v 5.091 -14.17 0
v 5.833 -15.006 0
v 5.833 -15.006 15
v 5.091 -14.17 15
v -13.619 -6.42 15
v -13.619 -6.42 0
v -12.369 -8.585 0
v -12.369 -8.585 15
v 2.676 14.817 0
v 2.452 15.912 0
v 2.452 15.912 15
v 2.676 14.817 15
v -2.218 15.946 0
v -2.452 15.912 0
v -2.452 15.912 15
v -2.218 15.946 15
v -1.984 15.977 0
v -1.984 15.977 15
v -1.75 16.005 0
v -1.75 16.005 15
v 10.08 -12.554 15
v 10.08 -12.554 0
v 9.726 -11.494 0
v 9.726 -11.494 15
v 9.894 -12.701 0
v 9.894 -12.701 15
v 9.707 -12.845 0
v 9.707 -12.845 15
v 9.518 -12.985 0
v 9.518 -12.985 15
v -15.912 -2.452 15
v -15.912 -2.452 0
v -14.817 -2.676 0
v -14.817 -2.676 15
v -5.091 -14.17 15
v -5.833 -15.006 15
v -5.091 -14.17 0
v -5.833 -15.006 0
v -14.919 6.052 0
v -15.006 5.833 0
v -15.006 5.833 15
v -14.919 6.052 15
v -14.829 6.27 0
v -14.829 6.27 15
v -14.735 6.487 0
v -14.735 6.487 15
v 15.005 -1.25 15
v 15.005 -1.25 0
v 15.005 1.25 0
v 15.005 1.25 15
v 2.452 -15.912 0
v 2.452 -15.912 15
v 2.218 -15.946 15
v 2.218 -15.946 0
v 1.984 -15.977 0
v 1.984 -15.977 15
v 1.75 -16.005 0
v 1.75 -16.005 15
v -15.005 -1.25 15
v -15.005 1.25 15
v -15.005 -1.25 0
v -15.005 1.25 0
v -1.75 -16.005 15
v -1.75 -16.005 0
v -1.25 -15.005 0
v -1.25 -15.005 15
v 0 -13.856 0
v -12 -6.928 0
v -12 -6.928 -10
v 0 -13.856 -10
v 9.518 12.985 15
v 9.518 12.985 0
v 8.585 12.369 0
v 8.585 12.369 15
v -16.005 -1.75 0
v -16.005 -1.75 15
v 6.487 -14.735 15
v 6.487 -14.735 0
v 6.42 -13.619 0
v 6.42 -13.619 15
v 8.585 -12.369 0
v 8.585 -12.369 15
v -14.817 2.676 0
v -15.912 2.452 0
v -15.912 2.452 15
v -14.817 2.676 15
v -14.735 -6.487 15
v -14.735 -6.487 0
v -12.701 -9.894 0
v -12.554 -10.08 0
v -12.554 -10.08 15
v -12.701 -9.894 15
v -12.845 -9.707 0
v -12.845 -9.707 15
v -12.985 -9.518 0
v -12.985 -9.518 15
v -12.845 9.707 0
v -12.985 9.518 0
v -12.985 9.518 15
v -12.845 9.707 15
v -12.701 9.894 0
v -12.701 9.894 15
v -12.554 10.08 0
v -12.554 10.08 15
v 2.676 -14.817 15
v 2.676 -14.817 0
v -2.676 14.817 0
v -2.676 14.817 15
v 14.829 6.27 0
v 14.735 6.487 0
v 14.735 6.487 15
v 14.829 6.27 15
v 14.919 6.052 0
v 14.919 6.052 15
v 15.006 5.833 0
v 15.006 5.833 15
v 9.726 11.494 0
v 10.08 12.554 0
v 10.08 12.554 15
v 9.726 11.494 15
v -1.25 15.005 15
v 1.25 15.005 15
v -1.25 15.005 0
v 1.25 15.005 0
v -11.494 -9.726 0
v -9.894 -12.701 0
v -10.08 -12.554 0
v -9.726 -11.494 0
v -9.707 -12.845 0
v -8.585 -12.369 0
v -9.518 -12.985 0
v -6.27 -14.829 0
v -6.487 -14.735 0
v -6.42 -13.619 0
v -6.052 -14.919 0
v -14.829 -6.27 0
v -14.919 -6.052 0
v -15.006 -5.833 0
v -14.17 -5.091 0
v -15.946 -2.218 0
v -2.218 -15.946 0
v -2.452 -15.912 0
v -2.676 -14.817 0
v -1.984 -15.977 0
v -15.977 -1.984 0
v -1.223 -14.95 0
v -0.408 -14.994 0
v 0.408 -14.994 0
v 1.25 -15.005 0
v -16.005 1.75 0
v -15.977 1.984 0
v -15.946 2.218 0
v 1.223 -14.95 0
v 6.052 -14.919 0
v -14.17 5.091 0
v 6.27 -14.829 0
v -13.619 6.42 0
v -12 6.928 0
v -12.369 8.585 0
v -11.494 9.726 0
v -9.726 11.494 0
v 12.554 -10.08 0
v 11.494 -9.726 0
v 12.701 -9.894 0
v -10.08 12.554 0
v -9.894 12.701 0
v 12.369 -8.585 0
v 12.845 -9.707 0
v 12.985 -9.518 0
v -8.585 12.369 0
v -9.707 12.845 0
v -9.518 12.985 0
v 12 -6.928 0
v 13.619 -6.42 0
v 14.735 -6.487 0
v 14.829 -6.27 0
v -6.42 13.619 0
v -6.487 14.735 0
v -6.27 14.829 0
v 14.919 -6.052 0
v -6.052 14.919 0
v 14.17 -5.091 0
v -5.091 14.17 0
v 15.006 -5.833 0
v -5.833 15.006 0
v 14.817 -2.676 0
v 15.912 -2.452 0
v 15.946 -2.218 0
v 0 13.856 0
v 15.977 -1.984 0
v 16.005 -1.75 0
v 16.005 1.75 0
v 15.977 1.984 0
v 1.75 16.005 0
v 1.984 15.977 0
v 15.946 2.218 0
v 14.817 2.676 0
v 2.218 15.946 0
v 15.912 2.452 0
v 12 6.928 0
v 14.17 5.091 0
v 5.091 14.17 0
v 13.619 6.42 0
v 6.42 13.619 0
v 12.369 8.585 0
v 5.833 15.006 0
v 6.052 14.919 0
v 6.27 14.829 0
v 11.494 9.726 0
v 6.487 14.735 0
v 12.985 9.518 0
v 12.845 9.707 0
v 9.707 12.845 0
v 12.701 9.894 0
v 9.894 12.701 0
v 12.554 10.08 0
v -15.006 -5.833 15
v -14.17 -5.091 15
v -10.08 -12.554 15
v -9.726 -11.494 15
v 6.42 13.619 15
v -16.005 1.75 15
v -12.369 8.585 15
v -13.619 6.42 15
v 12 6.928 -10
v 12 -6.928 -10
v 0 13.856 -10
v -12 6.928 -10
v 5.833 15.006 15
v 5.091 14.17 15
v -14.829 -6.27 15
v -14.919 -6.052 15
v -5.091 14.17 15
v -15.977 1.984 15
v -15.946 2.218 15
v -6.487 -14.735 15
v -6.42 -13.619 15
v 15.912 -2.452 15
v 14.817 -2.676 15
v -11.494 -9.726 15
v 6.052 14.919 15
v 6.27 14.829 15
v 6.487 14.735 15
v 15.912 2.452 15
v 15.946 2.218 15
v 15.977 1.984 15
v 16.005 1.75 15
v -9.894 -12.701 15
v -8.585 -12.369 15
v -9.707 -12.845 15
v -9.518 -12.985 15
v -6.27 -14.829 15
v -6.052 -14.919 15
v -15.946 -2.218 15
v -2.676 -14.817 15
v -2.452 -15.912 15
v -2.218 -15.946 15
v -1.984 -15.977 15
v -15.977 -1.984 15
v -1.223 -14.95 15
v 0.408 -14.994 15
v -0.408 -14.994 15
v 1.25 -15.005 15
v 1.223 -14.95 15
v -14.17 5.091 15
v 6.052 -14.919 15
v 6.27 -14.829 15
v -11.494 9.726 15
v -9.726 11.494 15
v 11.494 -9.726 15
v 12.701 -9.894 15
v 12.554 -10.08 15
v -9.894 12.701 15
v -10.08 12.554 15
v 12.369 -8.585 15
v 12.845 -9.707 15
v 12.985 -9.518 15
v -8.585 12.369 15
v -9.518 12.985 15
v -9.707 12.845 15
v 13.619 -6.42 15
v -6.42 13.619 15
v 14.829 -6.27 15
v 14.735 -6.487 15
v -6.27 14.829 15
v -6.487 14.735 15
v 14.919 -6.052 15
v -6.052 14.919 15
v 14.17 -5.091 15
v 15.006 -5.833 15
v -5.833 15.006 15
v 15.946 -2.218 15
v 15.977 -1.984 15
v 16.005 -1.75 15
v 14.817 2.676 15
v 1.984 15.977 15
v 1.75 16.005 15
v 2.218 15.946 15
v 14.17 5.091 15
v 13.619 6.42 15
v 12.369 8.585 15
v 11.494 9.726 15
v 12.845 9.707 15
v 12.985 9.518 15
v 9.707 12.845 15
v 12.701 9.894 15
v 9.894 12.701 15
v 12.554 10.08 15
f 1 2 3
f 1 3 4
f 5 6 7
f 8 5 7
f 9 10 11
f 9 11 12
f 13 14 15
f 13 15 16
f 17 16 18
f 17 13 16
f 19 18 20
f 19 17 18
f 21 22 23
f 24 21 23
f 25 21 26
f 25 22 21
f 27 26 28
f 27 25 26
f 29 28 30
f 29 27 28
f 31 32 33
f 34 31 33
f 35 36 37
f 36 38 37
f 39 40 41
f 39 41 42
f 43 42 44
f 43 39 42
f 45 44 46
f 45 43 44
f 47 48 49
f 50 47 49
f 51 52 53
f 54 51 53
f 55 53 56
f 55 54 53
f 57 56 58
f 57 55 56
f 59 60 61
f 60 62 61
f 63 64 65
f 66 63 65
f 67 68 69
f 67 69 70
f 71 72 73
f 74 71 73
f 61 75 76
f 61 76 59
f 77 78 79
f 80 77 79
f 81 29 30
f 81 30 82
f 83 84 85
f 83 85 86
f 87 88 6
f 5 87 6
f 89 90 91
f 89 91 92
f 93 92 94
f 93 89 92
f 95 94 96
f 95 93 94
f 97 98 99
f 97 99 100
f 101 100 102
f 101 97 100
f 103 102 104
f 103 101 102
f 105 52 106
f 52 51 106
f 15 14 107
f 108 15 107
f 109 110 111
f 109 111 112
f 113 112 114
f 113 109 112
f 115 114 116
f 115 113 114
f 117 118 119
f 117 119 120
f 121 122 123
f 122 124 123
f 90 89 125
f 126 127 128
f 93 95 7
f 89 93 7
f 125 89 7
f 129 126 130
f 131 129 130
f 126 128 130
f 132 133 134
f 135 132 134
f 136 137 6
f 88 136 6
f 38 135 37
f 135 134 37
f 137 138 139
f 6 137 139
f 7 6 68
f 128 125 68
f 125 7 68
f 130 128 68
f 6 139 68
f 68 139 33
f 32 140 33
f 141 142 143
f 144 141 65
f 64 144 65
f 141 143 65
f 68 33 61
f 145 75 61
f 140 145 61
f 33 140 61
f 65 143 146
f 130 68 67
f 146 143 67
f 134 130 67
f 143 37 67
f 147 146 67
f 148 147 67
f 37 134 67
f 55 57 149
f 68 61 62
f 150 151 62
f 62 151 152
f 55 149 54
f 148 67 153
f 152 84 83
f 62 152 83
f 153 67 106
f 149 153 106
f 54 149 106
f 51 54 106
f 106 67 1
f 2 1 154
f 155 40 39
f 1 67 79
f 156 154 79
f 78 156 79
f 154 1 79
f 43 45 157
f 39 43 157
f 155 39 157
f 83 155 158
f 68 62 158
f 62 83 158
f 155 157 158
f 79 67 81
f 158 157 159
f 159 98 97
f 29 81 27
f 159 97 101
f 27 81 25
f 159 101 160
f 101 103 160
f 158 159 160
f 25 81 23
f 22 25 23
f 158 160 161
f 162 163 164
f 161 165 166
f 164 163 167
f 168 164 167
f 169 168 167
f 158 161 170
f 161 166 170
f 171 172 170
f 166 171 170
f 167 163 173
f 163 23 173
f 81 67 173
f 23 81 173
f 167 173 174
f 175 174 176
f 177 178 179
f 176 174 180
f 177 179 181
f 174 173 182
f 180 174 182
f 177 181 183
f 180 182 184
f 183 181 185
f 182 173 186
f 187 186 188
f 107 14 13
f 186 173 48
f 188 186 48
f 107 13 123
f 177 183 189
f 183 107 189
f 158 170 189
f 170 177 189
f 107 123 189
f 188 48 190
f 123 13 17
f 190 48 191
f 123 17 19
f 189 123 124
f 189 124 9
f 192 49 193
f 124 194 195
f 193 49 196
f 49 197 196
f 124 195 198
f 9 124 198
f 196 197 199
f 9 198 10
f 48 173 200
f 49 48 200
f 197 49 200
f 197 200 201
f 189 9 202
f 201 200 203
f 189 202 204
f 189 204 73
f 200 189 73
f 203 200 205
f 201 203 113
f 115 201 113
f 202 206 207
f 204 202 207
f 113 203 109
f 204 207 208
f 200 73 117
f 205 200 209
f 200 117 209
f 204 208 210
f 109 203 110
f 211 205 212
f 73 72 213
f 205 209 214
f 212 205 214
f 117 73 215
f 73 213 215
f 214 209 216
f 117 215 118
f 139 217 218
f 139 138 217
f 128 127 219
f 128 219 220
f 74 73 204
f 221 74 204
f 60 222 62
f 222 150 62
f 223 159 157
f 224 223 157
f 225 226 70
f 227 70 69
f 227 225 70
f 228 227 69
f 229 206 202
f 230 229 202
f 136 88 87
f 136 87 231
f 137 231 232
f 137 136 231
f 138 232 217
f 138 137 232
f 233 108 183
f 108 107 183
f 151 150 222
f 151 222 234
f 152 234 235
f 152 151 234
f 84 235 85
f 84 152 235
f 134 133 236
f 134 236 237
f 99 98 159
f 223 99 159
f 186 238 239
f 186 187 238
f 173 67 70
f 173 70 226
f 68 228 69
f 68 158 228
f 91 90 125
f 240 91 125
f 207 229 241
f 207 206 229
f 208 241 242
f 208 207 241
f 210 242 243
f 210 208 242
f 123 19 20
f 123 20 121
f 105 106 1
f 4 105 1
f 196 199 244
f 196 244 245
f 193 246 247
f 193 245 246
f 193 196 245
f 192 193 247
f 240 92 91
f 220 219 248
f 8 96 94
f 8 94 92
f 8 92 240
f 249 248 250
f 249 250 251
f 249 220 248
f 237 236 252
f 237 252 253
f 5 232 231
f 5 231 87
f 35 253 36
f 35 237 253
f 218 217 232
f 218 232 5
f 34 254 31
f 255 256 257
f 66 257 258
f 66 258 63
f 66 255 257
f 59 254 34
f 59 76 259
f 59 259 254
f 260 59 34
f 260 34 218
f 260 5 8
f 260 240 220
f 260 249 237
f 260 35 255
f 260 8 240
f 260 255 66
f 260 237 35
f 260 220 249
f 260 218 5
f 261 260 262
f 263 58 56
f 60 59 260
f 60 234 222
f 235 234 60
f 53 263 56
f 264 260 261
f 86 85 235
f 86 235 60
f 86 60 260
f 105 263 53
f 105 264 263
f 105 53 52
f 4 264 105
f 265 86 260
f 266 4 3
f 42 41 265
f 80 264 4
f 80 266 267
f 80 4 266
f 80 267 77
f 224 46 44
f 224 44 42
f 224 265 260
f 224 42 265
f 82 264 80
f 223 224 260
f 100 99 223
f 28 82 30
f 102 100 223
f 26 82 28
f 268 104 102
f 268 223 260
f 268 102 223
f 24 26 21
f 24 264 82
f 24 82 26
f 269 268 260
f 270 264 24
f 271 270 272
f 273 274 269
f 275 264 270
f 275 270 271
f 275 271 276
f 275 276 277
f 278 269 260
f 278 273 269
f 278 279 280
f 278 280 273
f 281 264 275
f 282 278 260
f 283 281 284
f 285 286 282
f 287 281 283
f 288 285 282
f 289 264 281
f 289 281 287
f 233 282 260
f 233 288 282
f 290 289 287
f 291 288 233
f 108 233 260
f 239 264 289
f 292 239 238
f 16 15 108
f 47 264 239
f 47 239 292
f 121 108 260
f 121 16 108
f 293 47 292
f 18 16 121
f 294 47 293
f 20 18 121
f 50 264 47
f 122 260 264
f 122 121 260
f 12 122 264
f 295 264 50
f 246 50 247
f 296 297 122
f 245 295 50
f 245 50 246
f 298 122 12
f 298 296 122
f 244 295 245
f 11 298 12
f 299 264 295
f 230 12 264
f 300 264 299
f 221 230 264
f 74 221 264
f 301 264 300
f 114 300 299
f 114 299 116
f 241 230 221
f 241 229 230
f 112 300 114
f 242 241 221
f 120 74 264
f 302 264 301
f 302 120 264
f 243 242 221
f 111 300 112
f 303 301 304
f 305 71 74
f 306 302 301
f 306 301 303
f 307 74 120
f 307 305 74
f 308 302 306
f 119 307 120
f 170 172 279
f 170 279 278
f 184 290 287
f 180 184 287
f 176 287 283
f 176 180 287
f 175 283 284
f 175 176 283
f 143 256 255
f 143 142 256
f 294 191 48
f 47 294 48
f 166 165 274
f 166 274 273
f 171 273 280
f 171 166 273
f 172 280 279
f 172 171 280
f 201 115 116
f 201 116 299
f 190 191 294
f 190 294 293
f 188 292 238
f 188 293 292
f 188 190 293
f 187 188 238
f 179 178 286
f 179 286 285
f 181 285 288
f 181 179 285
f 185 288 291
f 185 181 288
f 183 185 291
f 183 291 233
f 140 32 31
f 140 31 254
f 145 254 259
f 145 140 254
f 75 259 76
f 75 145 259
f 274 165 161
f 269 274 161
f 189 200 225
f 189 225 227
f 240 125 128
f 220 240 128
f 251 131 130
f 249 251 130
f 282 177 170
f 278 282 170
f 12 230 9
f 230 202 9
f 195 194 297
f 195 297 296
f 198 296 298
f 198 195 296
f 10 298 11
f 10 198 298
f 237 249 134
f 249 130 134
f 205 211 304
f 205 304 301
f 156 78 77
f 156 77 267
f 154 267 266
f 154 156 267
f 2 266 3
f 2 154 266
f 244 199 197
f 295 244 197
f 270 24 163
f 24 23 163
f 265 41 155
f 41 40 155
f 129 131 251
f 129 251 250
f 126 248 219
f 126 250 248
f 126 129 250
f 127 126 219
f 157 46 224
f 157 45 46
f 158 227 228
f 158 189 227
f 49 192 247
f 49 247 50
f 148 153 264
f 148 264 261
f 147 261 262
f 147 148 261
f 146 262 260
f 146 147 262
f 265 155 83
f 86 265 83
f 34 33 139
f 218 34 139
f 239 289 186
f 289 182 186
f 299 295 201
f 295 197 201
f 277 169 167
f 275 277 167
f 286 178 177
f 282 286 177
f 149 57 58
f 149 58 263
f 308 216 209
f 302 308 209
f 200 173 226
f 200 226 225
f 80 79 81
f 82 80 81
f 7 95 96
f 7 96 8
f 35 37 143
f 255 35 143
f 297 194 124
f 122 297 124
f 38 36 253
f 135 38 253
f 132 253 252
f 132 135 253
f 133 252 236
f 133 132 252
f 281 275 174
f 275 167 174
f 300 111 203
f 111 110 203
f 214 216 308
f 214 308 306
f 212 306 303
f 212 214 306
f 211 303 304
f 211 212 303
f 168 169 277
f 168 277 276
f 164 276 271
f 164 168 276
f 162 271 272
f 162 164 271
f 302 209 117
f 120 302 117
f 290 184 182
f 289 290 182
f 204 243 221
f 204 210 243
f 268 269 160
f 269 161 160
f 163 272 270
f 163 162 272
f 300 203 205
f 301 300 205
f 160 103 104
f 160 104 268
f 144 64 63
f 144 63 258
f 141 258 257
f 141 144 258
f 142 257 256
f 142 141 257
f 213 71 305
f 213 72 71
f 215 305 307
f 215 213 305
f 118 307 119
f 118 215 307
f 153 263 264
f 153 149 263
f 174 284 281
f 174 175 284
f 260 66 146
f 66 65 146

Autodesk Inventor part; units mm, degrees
ref_plane "YZ Plane" through (0, 0, 0) normal (1, 0, 0) x (0, 1, 0)
ref_plane "XZ Plane" through (0, 0, 0) normal (0, 1, 0) x (-1, 0, 0)
ref_plane "XY Plane" through (0, 0, 0) normal (0, 0, 1) x (1, 0, 0)
sketch "Sketch1" plane through (0, 0, 0) normal (0, 0, 1) x (1, 0, 0)
  circle A0 centre (0, 0) radius 17.25
  circle A1 centre (0, 0) radius 16.1
  circle A2 centre (0, 0) radius 15
  line L0 (-1.25, -15.0046) -> (1.25, -15.0046)
  line L1 (-1.75, -16.0046) -> (1.75, -16.0046)
  line L2 (1.75, -16.0046) -> (1.25, -15.0046)
  line L3 (-1.75, -16.0046) -> (-1.25, -15.0046)
  line L4 (-1.25, -15.0046) -> (-1.2227, -14.9501)
  line L5 (1.25, -15.0046) -> (1.2227, -14.9501)
  line L6 (2.6761, -14.8169) -> (5.0909, -14.1698)
  line L7 (2.4519, -15.9122) -> (2.6761, -14.8169)
  line L8 (2.6761, -14.8169) -> (2.6883, -14.7571)
  line L9 (5.8327, -15.0063) -> (5.0909, -14.1698)
  line L10 (5.0909, -14.1698) -> (5.0504, -14.1242)
  line L11 (6.4198, -13.6194) -> (8.5848, -12.3694)
  line L12 (6.4868, -14.7354) -> (6.4198, -13.6194)
  line L13 (6.4198, -13.6194) -> (6.4161, -13.5585)
  line L14 (9.5178, -12.9854) -> (8.5848, -12.3694)
  line L15 (8.5848, -12.3694) -> (8.534, -12.3358)
  line L16 (9.726, -11.4937) -> (11.4937, -9.726)
  line L17 (10.0795, -12.5544) -> (9.726, -11.4937)
  line L18 (9.726, -11.4937) -> (9.7067, -11.4359)
  line L19 (12.5544, -10.0795) -> (11.4937, -9.726)
  line L20 (11.4937, -9.726) -> (11.4359, -9.7067)
  line L21 (12.3694, -8.5848) -> (13.6194, -6.4198)
  line L22 (12.9854, -9.5178) -> (12.3694, -8.5848)
  line L23 (12.3694, -8.5848) -> (12.3358, -8.534)
  line L24 (14.7354, -6.4868) -> (13.6194, -6.4198)
  line L25 (13.6194, -6.4198) -> (13.5585, -6.4161)
  line L26 (14.1698, -5.0909) -> (14.8169, -2.6761)
  line L27 (15.0063, -5.8327) -> (14.1698, -5.0909)
  line L28 (14.1698, -5.0909) -> (14.1242, -5.0504)
  line L29 (15.9122, -2.4519) -> (14.8169, -2.6761)
  line L30 (14.8169, -2.6761) -> (14.7571, -2.6883)
  line L31 (15.0046, -1.25) -> (15.0046, 1.25)
  line L32 (16.0046, -1.75) -> (15.0046, -1.25)
  line L33 (15.0046, -1.25) -> (14.9501, -1.2227)
  line L34 (16.0046, 1.75) -> (15.0046, 1.25)
  line L35 (15.0046, 1.25) -> (14.9501, 1.2227)
  line L36 (14.8169, 2.6761) -> (14.1698, 5.0909)
  line L37 (15.9122, 2.4519) -> (14.8169, 2.6761)
  line L38 (14.8169, 2.6761) -> (14.7571, 2.6883)
  line L39 (15.0063, 5.8327) -> (14.1698, 5.0909)
  line L40 (14.1698, 5.0909) -> (14.1242, 5.0504)
  line L41 (13.6194, 6.4198) -> (12.3694, 8.5848)
  line L42 (14.7354, 6.4868) -> (13.6194, 6.4198)
  line L43 (13.6194, 6.4198) -> (13.5585, 6.4161)
  line L44 (12.9854, 9.5178) -> (12.3694, 8.5848)
  line L45 (12.3694, 8.5848) -> (12.3358, 8.534)
  line L46 (11.4937, 9.726) -> (9.726, 11.4937)
  line L47 (12.5544, 10.0795) -> (11.4937, 9.726)
  line L48 (11.4937, 9.726) -> (11.4359, 9.7067)
  line L49 (10.0795, 12.5544) -> (9.726, 11.4937)
  line L50 (9.726, 11.4937) -> (9.7067, 11.4359)
  line L51 (8.5848, 12.3694) -> (6.4198, 13.6194)
  line L52 (9.5178, 12.9854) -> (8.5848, 12.3694)
  line L53 (8.5848, 12.3694) -> (8.534, 12.3358)
  line L54 (6.4868, 14.7354) -> (6.4198, 13.6194)
  line L55 (6.4198, 13.6194) -> (6.4161, 13.5585)
  line L56 (5.0909, 14.1698) -> (2.6761, 14.8169)
  line L57 (5.8327, 15.0063) -> (5.0909, 14.1698)
  line L58 (5.0909, 14.1698) -> (5.0504, 14.1242)
  line L59 (2.4519, 15.9122) -> (2.6761, 14.8169)
  line L60 (2.6761, 14.8169) -> (2.6883, 14.7571)
  line L61 (1.25, 15.0046) -> (-1.25, 15.0046)
  line L62 (1.75, 16.0046) -> (1.25, 15.0046)
  line L63 (1.25, 15.0046) -> (1.2227, 14.9501)
  line L64 (-1.75, 16.0046) -> (-1.25, 15.0046)
  line L65 (-1.25, 15.0046) -> (-1.2227, 14.9501)
  line L66 (-2.6761, 14.8169) -> (-5.0909, 14.1698)
  line L67 (-2.4519, 15.9122) -> (-2.6761, 14.8169)
  line L68 (-2.6761, 14.8169) -> (-2.6883, 14.7571)
  line L69 (-5.8327, 15.0063) -> (-5.0909, 14.1698)
  line L70 (-5.0909, 14.1698) -> (-5.0504, 14.1242)
  line L71 (-6.4198, 13.6194) -> (-8.5848, 12.3694)
  line L72 (-6.4868, 14.7354) -> (-6.4198, 13.6194)
  line L73 (-6.4198, 13.6194) -> (-6.4161, 13.5585)
  line L74 (-9.5178, 12.9854) -> (-8.5848, 12.3694)
  line L75 (-8.5848, 12.3694) -> (-8.534, 12.3358)
  line L76 (-9.726, 11.4937) -> (-11.4937, 9.726)
  line L77 (-10.0795, 12.5544) -> (-9.726, 11.4937)
  line L78 (-9.726, 11.4937) -> (-9.7067, 11.4359)
  line L79 (-12.5544, 10.0795) -> (-11.4937, 9.726)
  line L80 (-11.4937, 9.726) -> (-11.4359, 9.7067)
  line L81 (-12.3694, 8.5848) -> (-13.6194, 6.4198)
  line L82 (-12.9854, 9.5178) -> (-12.3694, 8.5848)
  line L83 (-12.3694, 8.5848) -> (-12.3358, 8.534)
  line L84 (-14.7354, 6.4868) -> (-13.6194, 6.4198)
  line L85 (-13.6194, 6.4198) -> (-13.5585, 6.4161)
  line L86 (-14.1698, 5.0909) -> (-14.8169, 2.6761)
  line L87 (-15.0063, 5.8327) -> (-14.1698, 5.0909)
  line L88 (-14.1698, 5.0909) -> (-14.1242, 5.0504)
  line L89 (-15.9122, 2.4519) -> (-14.8169, 2.6761)
  line L90 (-14.8169, 2.6761) -> (-14.7571, 2.6883)
  line L91 (-15.0046, 1.25) -> (-15.0046, -1.25)
  line L92 (-16.0046, 1.75) -> (-15.0046, 1.25)
  line L93 (-15.0046, 1.25) -> (-14.9501, 1.2227)
  line L94 (-16.0046, -1.75) -> (-15.0046, -1.25)
  line L95 (-15.0046, -1.25) -> (-14.9501, -1.2227)
  line L96 (-14.8169, -2.6761) -> (-14.1698, -5.0909)
  line L97 (-15.9122, -2.4519) -> (-14.8169, -2.6761)
  line L98 (-14.8169, -2.6761) -> (-14.7571, -2.6883)
  line L99 (-15.0063, -5.8327) -> (-14.1698, -5.0909)
  line L100 (-14.1698, -5.0909) -> (-14.1242, -5.0504)
  line L101 (-13.6194, -6.4198) -> (-12.3694, -8.5848)
  line L102 (-14.7354, -6.4868) -> (-13.6194, -6.4198)
  line L103 (-13.6194, -6.4198) -> (-13.5585, -6.4161)
  line L104 (-12.9854, -9.5178) -> (-12.3694, -8.5848)
  line L105 (-12.3694, -8.5848) -> (-12.3358, -8.534)
  line L106 (-11.4937, -9.726) -> (-9.726, -11.4937)
  line L107 (-12.5544, -10.0795) -> (-11.4937, -9.726)
  line L108 (-11.4937, -9.726) -> (-11.4359, -9.7067)
  line L109 (-10.0795, -12.5544) -> (-9.726, -11.4937)
  line L110 (-9.726, -11.4937) -> (-9.7067, -11.4359)
  line L111 (-8.5848, -12.3694) -> (-6.4198, -13.6194)
  line L112 (-9.5178, -12.9854) -> (-8.5848, -12.3694)
  line L113 (-8.5848, -12.3694) -> (-8.534, -12.3358)
  line L114 (-6.4868, -14.7354) -> (-6.4198, -13.6194)
  line L115 (-6.4198, -13.6194) -> (-6.4161, -13.5585)
  line L116 (-5.0909, -14.1698) -> (-2.6761, -14.8169)
  line L117 (-5.8327, -15.0063) -> (-5.0909, -14.1698)
  line L118 (-5.0909, -14.1698) -> (-5.0504, -14.1242)
  line L119 (-2.4519, -15.9122) -> (-2.6761, -14.8169)
  line L120 (-2.6761, -14.8169) -> (-2.6883, -14.7571)
  point P0 (0, -16.0046)
  point P1 (0, -15.0046)
  point P2 (1.75, -16.0046)
  point P3 (3.8835, -14.4933)
  point P4 (7.5023, -12.9944)
  point P5 (10.6099, -10.6099)
  point P6 (12.9944, -7.5023)
  point P7 (14.4933, -3.8835)
  point P8 (15.0046, 0)
  point P9 (14.4933, 3.8835)
  point P10 (12.9944, 7.5023)
  point P11 (10.6099, 10.6099)
  point P12 (7.5023, 12.9944)
  point P13 (3.8835, 14.4933)
  point P14 (0, 15.0046)
  point P15 (-3.8835, 14.4933)
  point P16 (-7.5023, 12.9944)
  point P17 (-10.6099, 10.6099)
  point P18 (-12.9944, 7.5023)
  point P19 (-14.4933, 3.8835)
  point P20 (-15.0046, 0)
  point P21 (-14.4933, -3.8835)
  point P22 (-12.9944, -7.5023)
  point P23 (-10.6099, -10.6099)
  point P24 (-7.5023, -12.9944)
  point P25 (-3.8835, -14.4933)
  dimension "d1" = 32.2
  dimension "d0" = 34.5
  dimension "d2" = 30
  dimension "d3" = 2.5
  dimension "d4" = 3.5
  dimension "d5" = 1
  dimension "d20" = 360
extrude "Extrusion1" add sketch "Sketch1" along normal blind 15 contours L34 L35 A2 L38 L37 A1 | A1 L29 L30 A2 L33 L32 | L31 L33 A2 L35 | L39 L40 A2 L43 L42 A1 | L38 A2 L40 L36 | A2 | A1 L24 L25 A2 L28 L27 | L26 L28 A2 L30 | L44 L45 A2 L48 L47 A1 | L43 A2 L45 L41 | A1 L19 L20 A2 L23 L22 | L21 L23 A2 L25 | L49 L50 A2 L53 L52 A1 | L48 A2 L50 L46 | A1 L14 L15 A2 L18 L17 | L16 L18 A2 L20 | L54 L55 A2 L58 L57 A1 | L53 A2 L55 L51 | A1 L9 L10 A2 L13 L12 | L11 L13 A2 L15 | L59 L60 A2 L63 L62 A1 | L58 A2 L60 L56 | A1 L2 L5 A2 L8 L7 | L6 L8 A2 L10 | L64 L65 A2 L68 L67 A1 | L63 A2 L65 L61 | A1 L119 L120 A2 L4 L3 | L69 L70 A2 L73 L72 A1 | L68 A2 L70 L66 | A1 L114 L115 A2 L118 L117 | L116 L118 A2 L120 | L74 L75 A2 L78 L77 A1 | L73 A2 L75 L71 | A1 L109 L110 A2 L113 L112 | L111 L113 A2 L115 | L79 L80 A2 L83 L82 A1 | L78 A2 L80 L76 | A1 L104 L105 A2 L108 L107 | L106 L108 A2 L110 | L84 L85 A2 L88 L87 A1 | L83 A2 L85 L81 | A1 L99 L100 A2 L103 L102 | L101 L103 A2 L105 | L89 L90 A2 L93 L92 A1 | L88 A2 L90 L86 | A1 L94 L95 A2 L98 L97 | L96 L98 A2 L100 | L93 A2 L95 L91
sketch "Sketch2" plane through (0, 0, 0) normal (0, 0, -1) x (-1, 0, 0)
  line L0 (12, 6.9282) -> (12, -6.9282)
  line L1 (12, -6.9282) -> (0, -13.8564)
  line L2 (0, -13.8564) -> (-12, -6.9282)
  line L3 (-12, -6.9282) -> (-12, 6.9282)
  line L4 (-12, 6.9282) -> (0, 13.8564)
  line L5 (0, 13.8564) -> (12, 6.9282)
  point P0 (0, 0)
  point P1 (0, 0)
  dimension "d12" = 24
extrude "Extrusion2" add sketch "Sketch2" along normal blind 10
sketch "Sketch3" plane through (0, 0, -10) normal (0, 0, -1) x (-1, 0, 0)
  circle A0 centre (0, 0) radius 7.5
  dimension "d15" = 15
extrude "Extrusion3" [suppressed]
sketch "Sketch4" plane through (0, 0, 0) normal (1, 0, 0) x (0, 1, 0)
  line L0 (20.8545, -11.8216) -> (-20.3089, -11.8216)
  line L1 (-20.3089, -11.8216) -> (-20.3089, 5.7592)
  line L2 (-20.3089, 5.7592) -> (20.8545, 5.7592)
  line L3 (20.8545, 5.7592) -> (20.8545, -11.8216)
  point P0 (0, 0)
extrude "Extrusion4" [suppressed]
properties part number "Nastavek Millard freewheel tool vecji trapze"
